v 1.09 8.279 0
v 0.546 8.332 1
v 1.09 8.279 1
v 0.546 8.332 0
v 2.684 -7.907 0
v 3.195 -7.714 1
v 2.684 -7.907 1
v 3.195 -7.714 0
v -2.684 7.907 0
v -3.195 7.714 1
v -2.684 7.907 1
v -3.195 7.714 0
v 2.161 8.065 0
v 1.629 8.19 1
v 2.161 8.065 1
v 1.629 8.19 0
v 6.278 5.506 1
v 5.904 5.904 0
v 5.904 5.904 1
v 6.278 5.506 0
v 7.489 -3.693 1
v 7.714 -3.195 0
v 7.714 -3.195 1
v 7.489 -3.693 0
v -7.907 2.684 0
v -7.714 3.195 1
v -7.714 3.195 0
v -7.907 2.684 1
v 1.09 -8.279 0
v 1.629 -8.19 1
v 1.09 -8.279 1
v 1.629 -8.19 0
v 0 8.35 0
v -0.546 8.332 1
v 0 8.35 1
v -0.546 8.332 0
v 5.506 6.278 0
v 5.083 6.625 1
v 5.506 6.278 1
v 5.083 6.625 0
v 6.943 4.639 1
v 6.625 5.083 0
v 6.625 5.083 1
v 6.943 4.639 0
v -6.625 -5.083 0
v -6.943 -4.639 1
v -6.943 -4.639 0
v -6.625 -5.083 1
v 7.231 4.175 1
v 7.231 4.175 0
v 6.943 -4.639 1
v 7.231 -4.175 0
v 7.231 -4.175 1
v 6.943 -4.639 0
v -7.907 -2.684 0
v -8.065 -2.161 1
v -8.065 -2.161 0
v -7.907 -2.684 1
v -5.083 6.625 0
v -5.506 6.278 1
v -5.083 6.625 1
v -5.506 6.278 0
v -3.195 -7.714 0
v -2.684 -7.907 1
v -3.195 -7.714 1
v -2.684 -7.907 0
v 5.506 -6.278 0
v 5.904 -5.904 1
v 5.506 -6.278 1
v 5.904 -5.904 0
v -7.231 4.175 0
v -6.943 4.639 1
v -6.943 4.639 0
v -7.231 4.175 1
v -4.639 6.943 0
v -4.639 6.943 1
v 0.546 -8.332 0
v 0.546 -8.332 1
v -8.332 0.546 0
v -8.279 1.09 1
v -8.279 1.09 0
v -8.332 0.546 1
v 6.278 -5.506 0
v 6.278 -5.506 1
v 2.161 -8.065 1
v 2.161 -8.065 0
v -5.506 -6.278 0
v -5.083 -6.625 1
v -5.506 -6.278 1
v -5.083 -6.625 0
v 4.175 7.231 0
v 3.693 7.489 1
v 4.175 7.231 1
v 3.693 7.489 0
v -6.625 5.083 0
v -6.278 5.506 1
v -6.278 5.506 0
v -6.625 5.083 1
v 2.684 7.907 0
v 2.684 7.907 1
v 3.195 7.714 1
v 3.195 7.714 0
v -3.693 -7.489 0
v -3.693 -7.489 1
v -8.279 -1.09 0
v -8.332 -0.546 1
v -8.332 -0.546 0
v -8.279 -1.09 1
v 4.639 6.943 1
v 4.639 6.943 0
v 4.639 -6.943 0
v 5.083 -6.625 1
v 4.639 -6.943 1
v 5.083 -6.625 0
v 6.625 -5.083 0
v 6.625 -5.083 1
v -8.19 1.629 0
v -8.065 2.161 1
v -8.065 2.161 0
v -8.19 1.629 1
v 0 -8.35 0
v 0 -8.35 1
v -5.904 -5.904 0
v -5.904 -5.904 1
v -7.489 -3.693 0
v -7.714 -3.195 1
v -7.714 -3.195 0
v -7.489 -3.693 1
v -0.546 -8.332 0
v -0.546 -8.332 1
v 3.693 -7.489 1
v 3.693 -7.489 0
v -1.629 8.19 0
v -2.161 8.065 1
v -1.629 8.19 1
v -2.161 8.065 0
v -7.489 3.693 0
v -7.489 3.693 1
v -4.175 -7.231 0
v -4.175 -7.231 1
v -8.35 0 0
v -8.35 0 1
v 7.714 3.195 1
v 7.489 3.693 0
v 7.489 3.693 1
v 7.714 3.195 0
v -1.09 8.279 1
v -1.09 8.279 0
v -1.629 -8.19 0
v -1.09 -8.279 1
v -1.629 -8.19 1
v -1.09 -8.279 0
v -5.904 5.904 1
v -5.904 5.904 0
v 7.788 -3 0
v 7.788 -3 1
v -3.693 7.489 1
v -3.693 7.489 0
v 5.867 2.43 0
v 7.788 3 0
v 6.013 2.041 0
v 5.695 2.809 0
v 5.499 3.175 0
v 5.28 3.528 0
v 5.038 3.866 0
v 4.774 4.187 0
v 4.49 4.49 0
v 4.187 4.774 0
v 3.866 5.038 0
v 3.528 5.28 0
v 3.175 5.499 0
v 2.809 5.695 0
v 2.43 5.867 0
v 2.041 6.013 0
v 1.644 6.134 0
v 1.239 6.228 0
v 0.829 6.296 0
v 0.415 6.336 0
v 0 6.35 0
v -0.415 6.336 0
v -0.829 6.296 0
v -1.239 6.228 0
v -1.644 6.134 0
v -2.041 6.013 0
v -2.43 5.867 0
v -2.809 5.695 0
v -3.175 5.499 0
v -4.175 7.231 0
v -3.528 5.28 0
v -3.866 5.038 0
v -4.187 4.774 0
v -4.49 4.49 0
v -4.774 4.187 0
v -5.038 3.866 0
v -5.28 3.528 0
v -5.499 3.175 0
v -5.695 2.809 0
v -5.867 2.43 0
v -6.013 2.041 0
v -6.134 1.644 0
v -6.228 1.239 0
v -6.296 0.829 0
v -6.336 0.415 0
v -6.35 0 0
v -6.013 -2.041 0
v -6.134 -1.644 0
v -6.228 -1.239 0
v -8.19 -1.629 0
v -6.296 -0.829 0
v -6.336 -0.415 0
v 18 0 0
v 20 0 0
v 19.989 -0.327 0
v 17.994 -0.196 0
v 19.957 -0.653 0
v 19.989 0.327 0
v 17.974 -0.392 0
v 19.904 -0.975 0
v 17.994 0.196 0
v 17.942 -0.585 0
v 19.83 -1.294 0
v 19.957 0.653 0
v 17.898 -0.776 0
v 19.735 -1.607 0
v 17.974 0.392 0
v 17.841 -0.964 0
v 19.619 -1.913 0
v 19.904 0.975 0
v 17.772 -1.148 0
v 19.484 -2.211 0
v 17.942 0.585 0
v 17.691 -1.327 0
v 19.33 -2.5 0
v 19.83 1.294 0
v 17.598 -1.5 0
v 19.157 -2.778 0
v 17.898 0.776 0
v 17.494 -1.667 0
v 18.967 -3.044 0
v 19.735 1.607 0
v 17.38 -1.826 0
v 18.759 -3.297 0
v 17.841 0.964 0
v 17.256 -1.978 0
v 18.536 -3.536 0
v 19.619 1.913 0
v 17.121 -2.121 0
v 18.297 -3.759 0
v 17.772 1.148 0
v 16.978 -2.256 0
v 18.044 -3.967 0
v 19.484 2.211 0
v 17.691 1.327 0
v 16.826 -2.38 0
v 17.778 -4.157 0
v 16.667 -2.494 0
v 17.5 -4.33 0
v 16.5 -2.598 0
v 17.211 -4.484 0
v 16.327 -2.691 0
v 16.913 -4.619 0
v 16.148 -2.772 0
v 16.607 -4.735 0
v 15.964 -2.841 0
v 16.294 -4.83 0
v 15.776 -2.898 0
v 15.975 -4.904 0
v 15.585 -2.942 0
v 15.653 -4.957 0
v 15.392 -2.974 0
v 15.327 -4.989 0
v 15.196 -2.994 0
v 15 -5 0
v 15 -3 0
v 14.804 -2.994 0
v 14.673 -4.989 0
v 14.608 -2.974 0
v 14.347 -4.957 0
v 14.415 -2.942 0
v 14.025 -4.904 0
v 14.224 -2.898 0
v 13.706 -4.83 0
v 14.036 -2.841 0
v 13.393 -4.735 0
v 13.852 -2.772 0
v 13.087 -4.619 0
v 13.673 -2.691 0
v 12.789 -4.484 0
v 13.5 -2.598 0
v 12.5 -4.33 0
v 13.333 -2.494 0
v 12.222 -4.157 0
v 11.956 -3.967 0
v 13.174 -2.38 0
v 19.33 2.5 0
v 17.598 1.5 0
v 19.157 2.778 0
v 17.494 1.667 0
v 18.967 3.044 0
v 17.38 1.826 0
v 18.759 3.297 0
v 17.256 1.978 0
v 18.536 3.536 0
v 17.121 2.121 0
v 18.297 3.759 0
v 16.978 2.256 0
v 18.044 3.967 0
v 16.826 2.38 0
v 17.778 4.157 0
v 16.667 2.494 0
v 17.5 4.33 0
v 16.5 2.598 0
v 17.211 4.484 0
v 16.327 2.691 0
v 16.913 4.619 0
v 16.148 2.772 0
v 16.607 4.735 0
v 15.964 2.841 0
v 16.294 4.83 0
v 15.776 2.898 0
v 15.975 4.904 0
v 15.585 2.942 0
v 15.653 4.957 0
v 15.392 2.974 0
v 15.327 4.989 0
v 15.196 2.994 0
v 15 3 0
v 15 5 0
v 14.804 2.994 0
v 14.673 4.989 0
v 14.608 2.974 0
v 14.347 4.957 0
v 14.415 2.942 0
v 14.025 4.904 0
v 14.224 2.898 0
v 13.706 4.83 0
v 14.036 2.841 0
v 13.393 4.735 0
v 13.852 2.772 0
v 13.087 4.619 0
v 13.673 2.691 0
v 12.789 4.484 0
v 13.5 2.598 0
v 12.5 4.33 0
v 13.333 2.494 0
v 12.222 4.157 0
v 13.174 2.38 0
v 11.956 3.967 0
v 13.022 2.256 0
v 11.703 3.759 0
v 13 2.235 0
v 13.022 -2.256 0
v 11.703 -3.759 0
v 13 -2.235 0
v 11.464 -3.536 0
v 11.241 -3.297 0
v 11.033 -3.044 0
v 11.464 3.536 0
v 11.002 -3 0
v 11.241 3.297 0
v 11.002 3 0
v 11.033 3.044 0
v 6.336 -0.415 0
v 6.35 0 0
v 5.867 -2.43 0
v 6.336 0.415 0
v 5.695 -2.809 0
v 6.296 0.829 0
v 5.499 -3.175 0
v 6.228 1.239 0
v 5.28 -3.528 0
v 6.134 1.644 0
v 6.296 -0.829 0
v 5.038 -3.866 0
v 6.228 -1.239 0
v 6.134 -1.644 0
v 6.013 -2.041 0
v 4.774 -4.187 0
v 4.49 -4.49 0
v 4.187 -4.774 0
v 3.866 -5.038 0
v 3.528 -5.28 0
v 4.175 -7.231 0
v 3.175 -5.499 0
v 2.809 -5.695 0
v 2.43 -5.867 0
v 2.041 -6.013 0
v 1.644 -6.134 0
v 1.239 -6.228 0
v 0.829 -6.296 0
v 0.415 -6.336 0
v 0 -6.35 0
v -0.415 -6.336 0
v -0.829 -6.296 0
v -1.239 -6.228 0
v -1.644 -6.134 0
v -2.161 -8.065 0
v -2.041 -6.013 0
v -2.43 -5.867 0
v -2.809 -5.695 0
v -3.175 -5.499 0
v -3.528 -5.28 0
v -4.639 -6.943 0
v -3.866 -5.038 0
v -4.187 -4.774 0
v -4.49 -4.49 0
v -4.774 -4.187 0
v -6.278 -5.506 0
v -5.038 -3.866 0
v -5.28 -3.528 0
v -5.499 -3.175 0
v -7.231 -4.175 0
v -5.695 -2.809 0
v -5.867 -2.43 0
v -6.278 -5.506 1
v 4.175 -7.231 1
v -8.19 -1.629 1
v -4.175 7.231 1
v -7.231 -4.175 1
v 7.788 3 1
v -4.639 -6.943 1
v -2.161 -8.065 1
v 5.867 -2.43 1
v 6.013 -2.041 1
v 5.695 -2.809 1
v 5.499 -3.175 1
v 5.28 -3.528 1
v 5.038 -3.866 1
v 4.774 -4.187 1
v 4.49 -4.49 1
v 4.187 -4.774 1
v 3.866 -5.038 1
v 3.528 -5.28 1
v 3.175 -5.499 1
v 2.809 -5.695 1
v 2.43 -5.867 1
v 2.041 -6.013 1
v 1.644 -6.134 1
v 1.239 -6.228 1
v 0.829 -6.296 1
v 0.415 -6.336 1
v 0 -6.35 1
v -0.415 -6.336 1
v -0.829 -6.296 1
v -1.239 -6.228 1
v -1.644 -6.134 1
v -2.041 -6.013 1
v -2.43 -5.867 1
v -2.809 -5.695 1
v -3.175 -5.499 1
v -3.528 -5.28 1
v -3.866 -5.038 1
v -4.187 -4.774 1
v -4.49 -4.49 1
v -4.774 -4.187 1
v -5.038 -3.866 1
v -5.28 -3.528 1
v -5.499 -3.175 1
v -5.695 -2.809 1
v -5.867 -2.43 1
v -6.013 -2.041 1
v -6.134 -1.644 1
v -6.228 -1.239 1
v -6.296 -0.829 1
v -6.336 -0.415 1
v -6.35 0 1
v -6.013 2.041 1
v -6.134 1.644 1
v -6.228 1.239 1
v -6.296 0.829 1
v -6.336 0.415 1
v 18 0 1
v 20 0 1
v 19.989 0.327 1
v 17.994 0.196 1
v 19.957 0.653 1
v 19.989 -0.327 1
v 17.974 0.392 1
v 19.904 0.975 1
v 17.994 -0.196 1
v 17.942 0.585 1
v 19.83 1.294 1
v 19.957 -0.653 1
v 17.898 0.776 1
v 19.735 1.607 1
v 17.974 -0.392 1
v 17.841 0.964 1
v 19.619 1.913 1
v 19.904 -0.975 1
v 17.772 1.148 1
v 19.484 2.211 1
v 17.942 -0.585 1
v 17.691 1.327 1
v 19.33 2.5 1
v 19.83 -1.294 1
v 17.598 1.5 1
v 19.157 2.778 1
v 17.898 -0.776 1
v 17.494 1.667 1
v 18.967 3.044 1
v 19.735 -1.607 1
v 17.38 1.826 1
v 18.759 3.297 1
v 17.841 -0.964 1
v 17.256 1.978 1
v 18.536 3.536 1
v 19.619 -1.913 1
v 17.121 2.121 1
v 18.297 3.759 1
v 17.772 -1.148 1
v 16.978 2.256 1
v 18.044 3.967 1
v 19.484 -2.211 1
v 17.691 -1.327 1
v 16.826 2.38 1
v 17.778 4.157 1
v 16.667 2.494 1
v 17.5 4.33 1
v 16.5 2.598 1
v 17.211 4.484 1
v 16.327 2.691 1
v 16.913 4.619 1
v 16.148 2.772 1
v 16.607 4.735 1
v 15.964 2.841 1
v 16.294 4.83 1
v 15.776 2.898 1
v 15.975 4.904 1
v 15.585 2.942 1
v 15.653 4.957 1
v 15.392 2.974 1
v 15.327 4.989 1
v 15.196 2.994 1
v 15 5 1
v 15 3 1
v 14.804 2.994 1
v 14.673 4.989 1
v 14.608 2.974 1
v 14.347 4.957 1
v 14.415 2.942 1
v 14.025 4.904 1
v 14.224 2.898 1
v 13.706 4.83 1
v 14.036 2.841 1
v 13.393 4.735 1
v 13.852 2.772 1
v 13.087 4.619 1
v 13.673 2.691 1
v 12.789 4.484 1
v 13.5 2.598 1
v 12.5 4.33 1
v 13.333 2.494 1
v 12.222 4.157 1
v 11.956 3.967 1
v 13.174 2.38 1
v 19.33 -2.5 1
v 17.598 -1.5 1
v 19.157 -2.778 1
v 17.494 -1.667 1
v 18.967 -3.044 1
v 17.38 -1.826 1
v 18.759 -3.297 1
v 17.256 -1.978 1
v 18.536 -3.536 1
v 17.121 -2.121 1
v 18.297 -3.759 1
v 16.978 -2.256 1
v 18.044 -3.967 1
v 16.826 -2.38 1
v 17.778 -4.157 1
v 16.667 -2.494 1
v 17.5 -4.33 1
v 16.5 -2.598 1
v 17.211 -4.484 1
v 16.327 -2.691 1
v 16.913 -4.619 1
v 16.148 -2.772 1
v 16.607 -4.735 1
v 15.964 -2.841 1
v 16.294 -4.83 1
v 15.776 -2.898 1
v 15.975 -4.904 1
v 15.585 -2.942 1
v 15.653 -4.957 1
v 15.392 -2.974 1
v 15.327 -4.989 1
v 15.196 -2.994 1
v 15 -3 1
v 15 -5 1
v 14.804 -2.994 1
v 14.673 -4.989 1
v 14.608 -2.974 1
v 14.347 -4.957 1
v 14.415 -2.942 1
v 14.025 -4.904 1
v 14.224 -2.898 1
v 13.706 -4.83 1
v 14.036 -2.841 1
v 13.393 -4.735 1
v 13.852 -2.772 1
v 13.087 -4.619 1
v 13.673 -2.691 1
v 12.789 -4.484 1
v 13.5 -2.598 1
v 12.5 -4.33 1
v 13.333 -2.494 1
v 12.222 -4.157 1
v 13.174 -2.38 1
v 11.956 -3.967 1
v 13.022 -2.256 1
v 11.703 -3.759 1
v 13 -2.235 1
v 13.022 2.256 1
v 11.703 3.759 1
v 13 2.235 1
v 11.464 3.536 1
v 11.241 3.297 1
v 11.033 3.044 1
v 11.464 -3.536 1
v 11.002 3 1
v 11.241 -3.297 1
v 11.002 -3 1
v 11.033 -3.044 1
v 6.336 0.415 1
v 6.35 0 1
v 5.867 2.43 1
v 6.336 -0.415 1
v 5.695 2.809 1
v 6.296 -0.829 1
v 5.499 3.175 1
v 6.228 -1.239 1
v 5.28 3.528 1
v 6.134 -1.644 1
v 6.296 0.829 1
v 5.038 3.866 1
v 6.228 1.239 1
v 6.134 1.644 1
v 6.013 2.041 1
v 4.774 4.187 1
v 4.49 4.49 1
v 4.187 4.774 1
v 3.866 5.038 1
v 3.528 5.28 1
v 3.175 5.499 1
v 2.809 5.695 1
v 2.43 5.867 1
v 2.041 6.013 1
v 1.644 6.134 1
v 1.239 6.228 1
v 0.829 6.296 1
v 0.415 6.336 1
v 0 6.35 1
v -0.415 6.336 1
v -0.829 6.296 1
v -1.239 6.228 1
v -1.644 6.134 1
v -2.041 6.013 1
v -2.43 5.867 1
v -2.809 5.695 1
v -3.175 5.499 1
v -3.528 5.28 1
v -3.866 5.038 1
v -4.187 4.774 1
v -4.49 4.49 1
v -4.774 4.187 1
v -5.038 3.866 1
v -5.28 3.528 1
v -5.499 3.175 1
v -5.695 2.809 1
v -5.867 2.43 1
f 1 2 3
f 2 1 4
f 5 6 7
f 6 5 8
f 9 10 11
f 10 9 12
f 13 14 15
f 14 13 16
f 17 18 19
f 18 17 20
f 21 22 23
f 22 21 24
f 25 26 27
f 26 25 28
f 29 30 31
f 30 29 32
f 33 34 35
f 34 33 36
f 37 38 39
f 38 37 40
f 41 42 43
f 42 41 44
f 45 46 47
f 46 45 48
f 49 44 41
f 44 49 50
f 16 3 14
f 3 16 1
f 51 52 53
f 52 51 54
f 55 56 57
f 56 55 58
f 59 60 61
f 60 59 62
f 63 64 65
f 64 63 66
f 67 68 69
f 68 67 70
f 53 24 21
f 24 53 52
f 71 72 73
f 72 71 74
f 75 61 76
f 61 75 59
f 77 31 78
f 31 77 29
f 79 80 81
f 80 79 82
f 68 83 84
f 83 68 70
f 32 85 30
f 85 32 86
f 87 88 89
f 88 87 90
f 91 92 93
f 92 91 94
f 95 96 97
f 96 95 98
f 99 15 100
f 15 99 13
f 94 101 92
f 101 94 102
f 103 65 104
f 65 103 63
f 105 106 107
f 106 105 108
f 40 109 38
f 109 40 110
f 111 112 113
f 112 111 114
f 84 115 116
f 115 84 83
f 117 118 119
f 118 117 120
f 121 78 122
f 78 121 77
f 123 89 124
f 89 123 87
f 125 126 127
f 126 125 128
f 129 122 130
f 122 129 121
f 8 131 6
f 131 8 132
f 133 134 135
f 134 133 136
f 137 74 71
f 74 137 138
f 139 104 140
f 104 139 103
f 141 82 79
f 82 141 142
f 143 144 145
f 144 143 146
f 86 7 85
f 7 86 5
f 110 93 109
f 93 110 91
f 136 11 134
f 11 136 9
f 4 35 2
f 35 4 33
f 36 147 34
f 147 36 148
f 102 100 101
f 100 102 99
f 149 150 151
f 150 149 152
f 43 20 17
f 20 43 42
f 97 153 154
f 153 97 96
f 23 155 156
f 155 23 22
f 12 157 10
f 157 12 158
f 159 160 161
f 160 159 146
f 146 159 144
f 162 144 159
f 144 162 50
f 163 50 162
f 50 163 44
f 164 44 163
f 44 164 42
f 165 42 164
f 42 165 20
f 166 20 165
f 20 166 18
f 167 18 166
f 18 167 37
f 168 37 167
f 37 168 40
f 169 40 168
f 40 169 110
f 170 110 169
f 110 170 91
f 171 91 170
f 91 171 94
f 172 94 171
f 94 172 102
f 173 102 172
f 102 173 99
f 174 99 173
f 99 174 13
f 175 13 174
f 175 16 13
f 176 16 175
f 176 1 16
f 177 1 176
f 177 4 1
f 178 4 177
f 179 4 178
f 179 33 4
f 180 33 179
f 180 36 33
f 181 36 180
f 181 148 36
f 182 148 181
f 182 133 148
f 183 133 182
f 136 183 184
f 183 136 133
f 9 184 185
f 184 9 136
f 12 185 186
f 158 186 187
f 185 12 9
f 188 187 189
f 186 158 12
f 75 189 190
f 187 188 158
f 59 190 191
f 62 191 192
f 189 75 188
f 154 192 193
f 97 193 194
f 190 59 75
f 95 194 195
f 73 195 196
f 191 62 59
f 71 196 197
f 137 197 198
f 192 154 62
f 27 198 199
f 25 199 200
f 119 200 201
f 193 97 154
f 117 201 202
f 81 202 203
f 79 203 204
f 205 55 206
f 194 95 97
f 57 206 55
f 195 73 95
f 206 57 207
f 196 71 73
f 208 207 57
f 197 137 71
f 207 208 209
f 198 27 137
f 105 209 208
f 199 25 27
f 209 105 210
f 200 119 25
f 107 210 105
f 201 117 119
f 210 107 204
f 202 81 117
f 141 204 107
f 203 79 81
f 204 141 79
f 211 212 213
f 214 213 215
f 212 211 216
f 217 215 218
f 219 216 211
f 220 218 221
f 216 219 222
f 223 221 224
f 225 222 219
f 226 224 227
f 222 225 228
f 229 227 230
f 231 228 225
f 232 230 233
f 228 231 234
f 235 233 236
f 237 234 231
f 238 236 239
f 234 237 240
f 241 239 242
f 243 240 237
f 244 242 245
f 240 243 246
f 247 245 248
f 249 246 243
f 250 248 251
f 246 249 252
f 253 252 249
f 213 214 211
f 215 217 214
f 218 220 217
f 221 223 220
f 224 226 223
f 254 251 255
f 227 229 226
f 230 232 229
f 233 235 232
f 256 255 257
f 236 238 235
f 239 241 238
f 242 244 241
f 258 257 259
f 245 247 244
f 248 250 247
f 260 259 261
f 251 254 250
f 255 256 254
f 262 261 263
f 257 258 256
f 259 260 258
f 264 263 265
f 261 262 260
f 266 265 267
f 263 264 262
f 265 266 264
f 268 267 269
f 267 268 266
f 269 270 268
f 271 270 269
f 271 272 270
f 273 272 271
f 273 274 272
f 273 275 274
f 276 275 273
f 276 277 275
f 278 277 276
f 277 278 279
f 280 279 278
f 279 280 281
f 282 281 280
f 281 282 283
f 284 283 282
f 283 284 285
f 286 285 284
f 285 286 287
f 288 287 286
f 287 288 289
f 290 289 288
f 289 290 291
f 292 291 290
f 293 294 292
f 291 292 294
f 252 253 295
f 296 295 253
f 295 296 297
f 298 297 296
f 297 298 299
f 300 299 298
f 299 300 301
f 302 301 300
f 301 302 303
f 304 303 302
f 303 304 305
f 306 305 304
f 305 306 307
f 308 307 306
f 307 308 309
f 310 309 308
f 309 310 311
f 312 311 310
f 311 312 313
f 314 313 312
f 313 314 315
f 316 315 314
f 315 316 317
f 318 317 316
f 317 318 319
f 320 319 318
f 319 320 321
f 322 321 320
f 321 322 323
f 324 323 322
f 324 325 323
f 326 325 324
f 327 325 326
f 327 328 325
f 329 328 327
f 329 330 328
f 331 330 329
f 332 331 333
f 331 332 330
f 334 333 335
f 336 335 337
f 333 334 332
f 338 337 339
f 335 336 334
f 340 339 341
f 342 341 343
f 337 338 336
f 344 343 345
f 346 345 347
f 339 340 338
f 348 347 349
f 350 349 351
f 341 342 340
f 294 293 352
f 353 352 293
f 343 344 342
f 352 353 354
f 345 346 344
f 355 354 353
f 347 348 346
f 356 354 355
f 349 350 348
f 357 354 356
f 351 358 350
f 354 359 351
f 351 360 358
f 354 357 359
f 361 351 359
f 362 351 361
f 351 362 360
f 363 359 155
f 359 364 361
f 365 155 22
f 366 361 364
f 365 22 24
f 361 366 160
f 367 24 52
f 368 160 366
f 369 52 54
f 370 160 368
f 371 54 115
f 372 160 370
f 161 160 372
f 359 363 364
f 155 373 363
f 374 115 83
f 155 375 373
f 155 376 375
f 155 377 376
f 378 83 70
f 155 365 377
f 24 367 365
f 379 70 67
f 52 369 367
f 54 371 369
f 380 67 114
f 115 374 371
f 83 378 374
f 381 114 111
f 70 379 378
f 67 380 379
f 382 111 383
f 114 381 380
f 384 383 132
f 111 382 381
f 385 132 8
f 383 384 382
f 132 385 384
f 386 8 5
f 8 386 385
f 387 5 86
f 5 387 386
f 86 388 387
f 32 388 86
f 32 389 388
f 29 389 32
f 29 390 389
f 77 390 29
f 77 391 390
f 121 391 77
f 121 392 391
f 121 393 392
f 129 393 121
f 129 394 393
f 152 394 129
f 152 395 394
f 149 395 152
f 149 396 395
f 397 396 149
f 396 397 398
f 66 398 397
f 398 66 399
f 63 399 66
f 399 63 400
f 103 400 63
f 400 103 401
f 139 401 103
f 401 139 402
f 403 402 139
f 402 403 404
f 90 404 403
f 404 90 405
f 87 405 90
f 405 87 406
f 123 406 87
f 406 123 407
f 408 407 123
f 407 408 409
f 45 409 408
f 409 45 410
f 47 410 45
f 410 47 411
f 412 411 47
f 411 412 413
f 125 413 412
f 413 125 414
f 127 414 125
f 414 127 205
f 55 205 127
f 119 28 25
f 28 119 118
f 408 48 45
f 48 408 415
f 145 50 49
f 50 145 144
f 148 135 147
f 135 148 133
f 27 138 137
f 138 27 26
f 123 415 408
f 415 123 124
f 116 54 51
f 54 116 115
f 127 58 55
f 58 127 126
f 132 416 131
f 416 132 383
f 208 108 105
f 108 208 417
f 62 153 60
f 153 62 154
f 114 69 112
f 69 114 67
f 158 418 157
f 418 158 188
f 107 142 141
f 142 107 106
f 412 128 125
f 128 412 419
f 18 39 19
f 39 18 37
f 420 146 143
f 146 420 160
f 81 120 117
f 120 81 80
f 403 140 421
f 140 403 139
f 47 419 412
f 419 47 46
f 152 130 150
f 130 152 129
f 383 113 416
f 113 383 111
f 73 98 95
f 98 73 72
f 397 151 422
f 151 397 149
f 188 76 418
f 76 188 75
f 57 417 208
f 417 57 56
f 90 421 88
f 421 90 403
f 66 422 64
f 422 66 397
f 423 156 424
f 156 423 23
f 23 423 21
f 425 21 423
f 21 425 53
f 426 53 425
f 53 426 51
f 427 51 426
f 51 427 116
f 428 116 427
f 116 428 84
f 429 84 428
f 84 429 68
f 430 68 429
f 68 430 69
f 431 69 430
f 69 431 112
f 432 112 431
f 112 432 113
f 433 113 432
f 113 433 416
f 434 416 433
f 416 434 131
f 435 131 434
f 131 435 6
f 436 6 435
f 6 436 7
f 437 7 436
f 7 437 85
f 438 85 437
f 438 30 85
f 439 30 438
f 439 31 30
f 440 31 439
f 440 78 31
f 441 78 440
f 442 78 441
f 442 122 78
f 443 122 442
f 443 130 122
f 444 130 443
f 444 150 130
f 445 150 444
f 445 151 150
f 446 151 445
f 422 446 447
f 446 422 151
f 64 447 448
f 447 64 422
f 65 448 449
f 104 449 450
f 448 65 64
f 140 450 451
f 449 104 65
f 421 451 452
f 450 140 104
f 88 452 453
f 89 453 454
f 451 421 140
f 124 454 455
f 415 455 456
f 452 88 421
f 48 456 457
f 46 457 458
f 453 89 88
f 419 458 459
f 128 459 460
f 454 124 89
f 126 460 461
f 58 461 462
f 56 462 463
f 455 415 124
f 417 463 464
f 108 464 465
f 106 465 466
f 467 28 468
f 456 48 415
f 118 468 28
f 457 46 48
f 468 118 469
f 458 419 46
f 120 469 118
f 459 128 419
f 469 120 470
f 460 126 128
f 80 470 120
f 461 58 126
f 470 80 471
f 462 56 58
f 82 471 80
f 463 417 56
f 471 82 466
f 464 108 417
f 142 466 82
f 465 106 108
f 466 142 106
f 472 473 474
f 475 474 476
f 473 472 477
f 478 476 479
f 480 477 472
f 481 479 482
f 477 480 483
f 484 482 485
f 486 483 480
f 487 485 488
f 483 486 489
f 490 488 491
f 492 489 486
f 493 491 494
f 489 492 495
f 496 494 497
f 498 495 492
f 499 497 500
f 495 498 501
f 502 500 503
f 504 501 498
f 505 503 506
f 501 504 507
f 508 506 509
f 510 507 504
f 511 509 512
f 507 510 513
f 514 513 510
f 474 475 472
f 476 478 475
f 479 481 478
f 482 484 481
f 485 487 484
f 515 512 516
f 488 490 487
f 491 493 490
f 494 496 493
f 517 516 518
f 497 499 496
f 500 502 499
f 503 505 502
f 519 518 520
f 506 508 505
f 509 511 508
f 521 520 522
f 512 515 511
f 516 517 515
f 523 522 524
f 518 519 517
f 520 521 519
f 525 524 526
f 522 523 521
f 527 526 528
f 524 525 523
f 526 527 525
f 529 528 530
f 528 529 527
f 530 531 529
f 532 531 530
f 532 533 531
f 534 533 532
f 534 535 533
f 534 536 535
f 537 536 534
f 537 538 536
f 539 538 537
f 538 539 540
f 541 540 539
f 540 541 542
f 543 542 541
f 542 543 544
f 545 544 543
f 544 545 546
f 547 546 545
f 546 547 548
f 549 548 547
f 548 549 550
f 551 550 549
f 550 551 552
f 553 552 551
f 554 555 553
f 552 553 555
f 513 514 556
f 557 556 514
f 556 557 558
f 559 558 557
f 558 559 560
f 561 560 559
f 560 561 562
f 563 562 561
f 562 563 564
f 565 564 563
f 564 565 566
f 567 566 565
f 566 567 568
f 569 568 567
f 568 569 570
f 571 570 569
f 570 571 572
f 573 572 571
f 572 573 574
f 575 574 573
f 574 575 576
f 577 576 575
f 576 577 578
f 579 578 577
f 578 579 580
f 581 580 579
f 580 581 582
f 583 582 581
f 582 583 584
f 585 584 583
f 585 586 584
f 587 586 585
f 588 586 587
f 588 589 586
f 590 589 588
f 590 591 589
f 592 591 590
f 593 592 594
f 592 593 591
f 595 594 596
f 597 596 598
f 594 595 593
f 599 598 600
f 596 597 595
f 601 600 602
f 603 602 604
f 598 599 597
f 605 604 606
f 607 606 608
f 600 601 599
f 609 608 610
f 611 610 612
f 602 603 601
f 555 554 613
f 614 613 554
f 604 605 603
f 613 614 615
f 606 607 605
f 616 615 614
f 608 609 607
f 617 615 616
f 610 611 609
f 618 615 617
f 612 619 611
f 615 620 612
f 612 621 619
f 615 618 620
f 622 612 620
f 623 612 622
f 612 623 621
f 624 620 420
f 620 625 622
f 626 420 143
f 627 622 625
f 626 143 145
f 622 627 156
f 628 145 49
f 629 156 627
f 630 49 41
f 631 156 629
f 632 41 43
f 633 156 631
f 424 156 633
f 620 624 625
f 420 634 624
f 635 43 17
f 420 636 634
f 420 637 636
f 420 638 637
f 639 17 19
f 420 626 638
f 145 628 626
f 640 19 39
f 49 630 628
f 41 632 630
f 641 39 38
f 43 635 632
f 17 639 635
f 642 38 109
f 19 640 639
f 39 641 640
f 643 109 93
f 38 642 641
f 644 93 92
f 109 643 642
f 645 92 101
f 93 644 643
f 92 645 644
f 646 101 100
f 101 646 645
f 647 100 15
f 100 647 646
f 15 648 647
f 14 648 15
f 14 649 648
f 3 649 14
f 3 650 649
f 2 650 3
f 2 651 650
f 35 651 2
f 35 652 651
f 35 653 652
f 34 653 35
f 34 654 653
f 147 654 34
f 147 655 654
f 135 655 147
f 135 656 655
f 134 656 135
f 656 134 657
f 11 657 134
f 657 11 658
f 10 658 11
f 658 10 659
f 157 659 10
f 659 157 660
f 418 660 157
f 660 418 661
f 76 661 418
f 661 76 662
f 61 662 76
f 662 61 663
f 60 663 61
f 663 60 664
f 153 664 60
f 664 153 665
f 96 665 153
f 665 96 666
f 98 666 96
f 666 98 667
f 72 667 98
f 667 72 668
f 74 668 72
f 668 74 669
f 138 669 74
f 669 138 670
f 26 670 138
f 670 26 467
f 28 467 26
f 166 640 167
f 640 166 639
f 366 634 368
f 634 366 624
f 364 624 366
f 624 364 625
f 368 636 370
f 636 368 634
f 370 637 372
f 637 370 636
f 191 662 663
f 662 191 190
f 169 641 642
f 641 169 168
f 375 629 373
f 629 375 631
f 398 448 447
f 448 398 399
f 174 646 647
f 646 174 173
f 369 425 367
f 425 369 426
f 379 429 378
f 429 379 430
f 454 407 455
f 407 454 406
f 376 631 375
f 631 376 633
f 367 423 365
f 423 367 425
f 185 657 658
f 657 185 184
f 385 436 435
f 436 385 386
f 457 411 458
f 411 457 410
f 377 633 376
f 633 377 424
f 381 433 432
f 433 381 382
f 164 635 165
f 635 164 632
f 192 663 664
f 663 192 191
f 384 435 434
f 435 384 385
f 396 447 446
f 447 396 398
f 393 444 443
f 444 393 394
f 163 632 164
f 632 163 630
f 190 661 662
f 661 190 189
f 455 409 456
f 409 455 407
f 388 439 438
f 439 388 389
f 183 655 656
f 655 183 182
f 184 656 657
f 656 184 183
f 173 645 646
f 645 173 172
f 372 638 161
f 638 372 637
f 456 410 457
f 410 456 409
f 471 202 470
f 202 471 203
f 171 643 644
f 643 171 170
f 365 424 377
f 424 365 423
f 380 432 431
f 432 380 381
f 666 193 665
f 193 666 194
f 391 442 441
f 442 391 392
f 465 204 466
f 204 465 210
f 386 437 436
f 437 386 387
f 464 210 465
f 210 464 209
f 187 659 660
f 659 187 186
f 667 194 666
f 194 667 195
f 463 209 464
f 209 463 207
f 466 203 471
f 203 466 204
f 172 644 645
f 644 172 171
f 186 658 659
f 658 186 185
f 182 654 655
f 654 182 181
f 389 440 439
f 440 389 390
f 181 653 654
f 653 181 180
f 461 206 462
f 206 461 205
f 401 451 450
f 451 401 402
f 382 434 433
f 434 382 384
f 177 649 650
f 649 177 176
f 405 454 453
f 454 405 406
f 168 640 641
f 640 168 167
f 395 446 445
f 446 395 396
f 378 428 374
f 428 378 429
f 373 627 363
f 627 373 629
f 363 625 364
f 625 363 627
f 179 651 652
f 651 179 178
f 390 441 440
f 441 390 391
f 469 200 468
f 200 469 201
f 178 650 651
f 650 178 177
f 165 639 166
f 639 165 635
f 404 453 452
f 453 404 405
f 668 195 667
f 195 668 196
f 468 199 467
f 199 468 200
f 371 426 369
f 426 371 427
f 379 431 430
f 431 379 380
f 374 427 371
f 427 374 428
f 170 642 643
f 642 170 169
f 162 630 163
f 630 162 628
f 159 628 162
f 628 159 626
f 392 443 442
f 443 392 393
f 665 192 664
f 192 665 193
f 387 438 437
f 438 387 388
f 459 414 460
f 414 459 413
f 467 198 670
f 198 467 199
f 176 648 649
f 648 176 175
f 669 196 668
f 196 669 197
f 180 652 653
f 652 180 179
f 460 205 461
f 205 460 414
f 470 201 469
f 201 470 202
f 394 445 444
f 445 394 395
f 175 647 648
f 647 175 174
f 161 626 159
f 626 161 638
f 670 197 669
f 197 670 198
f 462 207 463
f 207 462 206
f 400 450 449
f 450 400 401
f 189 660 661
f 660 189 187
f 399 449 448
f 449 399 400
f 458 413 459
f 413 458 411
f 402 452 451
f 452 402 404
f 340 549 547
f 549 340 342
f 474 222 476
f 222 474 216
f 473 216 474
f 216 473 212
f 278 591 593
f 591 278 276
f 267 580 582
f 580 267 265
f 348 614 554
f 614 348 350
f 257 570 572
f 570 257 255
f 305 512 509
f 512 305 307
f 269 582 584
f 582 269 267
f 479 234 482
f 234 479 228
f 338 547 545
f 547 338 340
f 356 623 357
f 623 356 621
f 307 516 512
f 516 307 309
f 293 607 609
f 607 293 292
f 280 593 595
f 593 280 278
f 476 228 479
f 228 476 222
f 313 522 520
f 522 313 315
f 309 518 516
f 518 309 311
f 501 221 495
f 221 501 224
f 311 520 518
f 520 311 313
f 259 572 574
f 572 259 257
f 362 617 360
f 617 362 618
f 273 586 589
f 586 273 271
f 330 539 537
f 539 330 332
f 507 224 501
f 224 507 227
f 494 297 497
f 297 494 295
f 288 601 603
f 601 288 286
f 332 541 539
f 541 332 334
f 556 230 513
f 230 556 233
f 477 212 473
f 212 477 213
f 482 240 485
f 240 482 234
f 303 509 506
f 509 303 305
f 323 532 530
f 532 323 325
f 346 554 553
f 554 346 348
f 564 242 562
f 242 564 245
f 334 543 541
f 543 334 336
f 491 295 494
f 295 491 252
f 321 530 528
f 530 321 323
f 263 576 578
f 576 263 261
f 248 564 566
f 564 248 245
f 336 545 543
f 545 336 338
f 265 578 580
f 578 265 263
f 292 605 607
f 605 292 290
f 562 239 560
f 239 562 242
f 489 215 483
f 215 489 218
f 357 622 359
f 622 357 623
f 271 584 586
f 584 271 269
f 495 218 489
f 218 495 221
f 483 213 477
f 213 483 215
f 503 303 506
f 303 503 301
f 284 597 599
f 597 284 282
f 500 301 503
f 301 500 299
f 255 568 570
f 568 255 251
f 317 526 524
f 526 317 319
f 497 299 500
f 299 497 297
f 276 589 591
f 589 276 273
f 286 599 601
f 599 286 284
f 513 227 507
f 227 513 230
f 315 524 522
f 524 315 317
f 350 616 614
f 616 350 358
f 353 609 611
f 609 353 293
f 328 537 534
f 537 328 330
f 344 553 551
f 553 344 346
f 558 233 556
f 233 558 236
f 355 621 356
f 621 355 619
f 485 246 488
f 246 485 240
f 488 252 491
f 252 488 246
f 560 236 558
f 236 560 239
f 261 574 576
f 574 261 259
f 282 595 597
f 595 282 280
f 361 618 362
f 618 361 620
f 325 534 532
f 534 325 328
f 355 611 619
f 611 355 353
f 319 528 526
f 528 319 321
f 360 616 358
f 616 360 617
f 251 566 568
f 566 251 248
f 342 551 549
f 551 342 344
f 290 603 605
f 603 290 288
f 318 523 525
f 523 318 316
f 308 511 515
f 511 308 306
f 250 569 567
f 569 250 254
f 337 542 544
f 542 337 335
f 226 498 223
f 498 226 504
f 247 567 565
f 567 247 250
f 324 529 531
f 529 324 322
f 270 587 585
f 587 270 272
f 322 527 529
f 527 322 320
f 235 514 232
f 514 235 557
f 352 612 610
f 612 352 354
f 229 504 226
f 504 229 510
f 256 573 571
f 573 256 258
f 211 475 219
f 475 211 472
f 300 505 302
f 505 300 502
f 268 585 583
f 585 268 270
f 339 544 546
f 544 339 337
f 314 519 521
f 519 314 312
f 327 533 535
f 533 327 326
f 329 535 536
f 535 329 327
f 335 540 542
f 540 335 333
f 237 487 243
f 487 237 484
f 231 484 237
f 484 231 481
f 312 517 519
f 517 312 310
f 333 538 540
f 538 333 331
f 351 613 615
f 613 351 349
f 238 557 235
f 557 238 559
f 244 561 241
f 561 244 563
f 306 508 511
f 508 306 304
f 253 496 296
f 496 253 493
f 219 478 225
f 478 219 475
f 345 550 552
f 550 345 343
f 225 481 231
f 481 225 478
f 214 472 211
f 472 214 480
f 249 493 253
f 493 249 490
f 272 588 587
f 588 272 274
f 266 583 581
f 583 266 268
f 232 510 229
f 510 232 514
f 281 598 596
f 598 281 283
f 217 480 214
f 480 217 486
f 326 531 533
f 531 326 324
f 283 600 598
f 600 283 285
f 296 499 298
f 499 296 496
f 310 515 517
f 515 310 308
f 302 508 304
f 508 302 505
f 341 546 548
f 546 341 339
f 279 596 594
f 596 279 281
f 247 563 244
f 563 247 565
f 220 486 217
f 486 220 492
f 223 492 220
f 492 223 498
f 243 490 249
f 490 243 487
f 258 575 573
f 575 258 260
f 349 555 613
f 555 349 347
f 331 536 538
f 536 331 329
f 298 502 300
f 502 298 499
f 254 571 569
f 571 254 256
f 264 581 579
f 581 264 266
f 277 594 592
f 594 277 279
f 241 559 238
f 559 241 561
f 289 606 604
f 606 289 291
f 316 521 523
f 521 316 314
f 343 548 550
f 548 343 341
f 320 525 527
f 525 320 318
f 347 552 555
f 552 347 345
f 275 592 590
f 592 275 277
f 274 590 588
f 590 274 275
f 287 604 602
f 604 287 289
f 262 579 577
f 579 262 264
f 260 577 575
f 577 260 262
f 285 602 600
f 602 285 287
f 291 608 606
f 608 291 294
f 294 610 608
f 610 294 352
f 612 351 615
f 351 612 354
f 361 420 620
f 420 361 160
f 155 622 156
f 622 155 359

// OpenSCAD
// Snap-on clip: tubing holder next to a 12.7 mm lab stand rod
// Print orientation: flat on the bed (XY), extruded up in +Z

// ---------------- Parameters ----------------
clip_h      = 10;    // extrusion height (Z), mm
wall        = 2;     // wall thickness for all rings, mm

rod_id      = 12.7;  // stand rod diameter, mm
rod_od      = rod_id + 2 * wall;   // outer diameter of the rod ring, mm
rod_x0      = 0;     // rod ring centre X
rod_y0      = 0;     // rod ring centre Y

tube_id     = 6;     // tubing inner diameter, mm
tube_od     = tube_id + 2 * wall;  // tubing ring outer diameter, mm
tube_x0     = 15;    // tubing ring centre X
tube_y0     = 0;     // tubing ring centre Y

bridge_x0   = 10;    // bridge span middle X (between x = 8 and x = 12)
bridge_w    = 6;     // bridge width along Y, mm

eps         = 0.5;   // cutter overshoot past faces, mm
$fn         = 96;    // circle resolution

// ---------------- Profile ----------------
module ring_2d(od, x0, y0) {
    translate([x0, y0, 0])
        difference() {
            cylinder(d = od, h = 1);
            translate([0, 0, -eps])
                cylinder(d = od - 2 * wall, h = 1 + 2 * eps);
        }
}

module opening(w, h, x0, y0) {
    translate([x0, y0, 0])
        difference() {
            translate([-w / 2, -h / 2, 0])
                cube([w, h, 1]);
            translate([-w / 2 - eps, -h / 2 - eps, 0])
                cube([w + 2 * eps, h + 2 * eps, 1]);
        }
}

// ---------------- Model ----------------
difference() {
    union() {
        // Rod ring (18.7 mm OD) with a 10 mm wide opening on the -X side
        ring_2d(rod_od, rod_x0, rod_y0);
        opening(w = 10, h = 10, x0 = rod_x0 - 5, y0 = rod_y0);

        // Tubing ring (10 mm OD) with a 4.5 mm wide opening on the +X side
        ring_2d(tube_od, tube_x0, tube_y0);
        opening(w = 4.5, h = tube_od, x0 = tube_x0 + 2.25, y0 = tube_y0);

        // Solid bridge between x = 8 and x = 12, 6 mm wide in Y
        translate([bridge_x0 - 3, -bridge_w / 2, 0])
            cube([6, bridge_w, 1]);
    }

    // Cut the stand rod through the rod ring
    translate([rod_x0, 0, 0])
        cylinder(d = rod_id, h = clip_h + 2 * eps, center = true);
}

// ---------------- Output ----------------
translate([0, 0, 0])
    linear_extrude(height = clip_h)
        profile();

module profile() {
    // 2-D profile drawn in XY, then extruded to Z
    union() {
        // Rod ring (18.7 mm OD) with a 10 mm wide opening on the -X side
        ring_2d(rod_od, rod_x0, rod_y0);
        opening(w = 10, h = 10, x0 = rod_x0 - 5, y0 = rod_y0);

        // Tubing ring (10 mm OD) with a 4.5 mm wide opening on the +X side
        ring_2d(tube_od, tube_x0, tube_y0);
        opening(w = 4.5, h = tube_od, x0 = tube_x0 + 2.25, y0 = tube_y0);

        // Solid bridge between x = 8 and x = 12, 6 mm wide in Y
        translate([bridge_x0 - 3, -bridge_w / 2, 0])
            cube([6, bridge_w, 1]);
    }

    // Cut the stand rod through the rod ring
    translate([rod_x0, 0, 0])
        cylinder(d = rod_id, h = clip_h + 2 * eps, center = true);
}
